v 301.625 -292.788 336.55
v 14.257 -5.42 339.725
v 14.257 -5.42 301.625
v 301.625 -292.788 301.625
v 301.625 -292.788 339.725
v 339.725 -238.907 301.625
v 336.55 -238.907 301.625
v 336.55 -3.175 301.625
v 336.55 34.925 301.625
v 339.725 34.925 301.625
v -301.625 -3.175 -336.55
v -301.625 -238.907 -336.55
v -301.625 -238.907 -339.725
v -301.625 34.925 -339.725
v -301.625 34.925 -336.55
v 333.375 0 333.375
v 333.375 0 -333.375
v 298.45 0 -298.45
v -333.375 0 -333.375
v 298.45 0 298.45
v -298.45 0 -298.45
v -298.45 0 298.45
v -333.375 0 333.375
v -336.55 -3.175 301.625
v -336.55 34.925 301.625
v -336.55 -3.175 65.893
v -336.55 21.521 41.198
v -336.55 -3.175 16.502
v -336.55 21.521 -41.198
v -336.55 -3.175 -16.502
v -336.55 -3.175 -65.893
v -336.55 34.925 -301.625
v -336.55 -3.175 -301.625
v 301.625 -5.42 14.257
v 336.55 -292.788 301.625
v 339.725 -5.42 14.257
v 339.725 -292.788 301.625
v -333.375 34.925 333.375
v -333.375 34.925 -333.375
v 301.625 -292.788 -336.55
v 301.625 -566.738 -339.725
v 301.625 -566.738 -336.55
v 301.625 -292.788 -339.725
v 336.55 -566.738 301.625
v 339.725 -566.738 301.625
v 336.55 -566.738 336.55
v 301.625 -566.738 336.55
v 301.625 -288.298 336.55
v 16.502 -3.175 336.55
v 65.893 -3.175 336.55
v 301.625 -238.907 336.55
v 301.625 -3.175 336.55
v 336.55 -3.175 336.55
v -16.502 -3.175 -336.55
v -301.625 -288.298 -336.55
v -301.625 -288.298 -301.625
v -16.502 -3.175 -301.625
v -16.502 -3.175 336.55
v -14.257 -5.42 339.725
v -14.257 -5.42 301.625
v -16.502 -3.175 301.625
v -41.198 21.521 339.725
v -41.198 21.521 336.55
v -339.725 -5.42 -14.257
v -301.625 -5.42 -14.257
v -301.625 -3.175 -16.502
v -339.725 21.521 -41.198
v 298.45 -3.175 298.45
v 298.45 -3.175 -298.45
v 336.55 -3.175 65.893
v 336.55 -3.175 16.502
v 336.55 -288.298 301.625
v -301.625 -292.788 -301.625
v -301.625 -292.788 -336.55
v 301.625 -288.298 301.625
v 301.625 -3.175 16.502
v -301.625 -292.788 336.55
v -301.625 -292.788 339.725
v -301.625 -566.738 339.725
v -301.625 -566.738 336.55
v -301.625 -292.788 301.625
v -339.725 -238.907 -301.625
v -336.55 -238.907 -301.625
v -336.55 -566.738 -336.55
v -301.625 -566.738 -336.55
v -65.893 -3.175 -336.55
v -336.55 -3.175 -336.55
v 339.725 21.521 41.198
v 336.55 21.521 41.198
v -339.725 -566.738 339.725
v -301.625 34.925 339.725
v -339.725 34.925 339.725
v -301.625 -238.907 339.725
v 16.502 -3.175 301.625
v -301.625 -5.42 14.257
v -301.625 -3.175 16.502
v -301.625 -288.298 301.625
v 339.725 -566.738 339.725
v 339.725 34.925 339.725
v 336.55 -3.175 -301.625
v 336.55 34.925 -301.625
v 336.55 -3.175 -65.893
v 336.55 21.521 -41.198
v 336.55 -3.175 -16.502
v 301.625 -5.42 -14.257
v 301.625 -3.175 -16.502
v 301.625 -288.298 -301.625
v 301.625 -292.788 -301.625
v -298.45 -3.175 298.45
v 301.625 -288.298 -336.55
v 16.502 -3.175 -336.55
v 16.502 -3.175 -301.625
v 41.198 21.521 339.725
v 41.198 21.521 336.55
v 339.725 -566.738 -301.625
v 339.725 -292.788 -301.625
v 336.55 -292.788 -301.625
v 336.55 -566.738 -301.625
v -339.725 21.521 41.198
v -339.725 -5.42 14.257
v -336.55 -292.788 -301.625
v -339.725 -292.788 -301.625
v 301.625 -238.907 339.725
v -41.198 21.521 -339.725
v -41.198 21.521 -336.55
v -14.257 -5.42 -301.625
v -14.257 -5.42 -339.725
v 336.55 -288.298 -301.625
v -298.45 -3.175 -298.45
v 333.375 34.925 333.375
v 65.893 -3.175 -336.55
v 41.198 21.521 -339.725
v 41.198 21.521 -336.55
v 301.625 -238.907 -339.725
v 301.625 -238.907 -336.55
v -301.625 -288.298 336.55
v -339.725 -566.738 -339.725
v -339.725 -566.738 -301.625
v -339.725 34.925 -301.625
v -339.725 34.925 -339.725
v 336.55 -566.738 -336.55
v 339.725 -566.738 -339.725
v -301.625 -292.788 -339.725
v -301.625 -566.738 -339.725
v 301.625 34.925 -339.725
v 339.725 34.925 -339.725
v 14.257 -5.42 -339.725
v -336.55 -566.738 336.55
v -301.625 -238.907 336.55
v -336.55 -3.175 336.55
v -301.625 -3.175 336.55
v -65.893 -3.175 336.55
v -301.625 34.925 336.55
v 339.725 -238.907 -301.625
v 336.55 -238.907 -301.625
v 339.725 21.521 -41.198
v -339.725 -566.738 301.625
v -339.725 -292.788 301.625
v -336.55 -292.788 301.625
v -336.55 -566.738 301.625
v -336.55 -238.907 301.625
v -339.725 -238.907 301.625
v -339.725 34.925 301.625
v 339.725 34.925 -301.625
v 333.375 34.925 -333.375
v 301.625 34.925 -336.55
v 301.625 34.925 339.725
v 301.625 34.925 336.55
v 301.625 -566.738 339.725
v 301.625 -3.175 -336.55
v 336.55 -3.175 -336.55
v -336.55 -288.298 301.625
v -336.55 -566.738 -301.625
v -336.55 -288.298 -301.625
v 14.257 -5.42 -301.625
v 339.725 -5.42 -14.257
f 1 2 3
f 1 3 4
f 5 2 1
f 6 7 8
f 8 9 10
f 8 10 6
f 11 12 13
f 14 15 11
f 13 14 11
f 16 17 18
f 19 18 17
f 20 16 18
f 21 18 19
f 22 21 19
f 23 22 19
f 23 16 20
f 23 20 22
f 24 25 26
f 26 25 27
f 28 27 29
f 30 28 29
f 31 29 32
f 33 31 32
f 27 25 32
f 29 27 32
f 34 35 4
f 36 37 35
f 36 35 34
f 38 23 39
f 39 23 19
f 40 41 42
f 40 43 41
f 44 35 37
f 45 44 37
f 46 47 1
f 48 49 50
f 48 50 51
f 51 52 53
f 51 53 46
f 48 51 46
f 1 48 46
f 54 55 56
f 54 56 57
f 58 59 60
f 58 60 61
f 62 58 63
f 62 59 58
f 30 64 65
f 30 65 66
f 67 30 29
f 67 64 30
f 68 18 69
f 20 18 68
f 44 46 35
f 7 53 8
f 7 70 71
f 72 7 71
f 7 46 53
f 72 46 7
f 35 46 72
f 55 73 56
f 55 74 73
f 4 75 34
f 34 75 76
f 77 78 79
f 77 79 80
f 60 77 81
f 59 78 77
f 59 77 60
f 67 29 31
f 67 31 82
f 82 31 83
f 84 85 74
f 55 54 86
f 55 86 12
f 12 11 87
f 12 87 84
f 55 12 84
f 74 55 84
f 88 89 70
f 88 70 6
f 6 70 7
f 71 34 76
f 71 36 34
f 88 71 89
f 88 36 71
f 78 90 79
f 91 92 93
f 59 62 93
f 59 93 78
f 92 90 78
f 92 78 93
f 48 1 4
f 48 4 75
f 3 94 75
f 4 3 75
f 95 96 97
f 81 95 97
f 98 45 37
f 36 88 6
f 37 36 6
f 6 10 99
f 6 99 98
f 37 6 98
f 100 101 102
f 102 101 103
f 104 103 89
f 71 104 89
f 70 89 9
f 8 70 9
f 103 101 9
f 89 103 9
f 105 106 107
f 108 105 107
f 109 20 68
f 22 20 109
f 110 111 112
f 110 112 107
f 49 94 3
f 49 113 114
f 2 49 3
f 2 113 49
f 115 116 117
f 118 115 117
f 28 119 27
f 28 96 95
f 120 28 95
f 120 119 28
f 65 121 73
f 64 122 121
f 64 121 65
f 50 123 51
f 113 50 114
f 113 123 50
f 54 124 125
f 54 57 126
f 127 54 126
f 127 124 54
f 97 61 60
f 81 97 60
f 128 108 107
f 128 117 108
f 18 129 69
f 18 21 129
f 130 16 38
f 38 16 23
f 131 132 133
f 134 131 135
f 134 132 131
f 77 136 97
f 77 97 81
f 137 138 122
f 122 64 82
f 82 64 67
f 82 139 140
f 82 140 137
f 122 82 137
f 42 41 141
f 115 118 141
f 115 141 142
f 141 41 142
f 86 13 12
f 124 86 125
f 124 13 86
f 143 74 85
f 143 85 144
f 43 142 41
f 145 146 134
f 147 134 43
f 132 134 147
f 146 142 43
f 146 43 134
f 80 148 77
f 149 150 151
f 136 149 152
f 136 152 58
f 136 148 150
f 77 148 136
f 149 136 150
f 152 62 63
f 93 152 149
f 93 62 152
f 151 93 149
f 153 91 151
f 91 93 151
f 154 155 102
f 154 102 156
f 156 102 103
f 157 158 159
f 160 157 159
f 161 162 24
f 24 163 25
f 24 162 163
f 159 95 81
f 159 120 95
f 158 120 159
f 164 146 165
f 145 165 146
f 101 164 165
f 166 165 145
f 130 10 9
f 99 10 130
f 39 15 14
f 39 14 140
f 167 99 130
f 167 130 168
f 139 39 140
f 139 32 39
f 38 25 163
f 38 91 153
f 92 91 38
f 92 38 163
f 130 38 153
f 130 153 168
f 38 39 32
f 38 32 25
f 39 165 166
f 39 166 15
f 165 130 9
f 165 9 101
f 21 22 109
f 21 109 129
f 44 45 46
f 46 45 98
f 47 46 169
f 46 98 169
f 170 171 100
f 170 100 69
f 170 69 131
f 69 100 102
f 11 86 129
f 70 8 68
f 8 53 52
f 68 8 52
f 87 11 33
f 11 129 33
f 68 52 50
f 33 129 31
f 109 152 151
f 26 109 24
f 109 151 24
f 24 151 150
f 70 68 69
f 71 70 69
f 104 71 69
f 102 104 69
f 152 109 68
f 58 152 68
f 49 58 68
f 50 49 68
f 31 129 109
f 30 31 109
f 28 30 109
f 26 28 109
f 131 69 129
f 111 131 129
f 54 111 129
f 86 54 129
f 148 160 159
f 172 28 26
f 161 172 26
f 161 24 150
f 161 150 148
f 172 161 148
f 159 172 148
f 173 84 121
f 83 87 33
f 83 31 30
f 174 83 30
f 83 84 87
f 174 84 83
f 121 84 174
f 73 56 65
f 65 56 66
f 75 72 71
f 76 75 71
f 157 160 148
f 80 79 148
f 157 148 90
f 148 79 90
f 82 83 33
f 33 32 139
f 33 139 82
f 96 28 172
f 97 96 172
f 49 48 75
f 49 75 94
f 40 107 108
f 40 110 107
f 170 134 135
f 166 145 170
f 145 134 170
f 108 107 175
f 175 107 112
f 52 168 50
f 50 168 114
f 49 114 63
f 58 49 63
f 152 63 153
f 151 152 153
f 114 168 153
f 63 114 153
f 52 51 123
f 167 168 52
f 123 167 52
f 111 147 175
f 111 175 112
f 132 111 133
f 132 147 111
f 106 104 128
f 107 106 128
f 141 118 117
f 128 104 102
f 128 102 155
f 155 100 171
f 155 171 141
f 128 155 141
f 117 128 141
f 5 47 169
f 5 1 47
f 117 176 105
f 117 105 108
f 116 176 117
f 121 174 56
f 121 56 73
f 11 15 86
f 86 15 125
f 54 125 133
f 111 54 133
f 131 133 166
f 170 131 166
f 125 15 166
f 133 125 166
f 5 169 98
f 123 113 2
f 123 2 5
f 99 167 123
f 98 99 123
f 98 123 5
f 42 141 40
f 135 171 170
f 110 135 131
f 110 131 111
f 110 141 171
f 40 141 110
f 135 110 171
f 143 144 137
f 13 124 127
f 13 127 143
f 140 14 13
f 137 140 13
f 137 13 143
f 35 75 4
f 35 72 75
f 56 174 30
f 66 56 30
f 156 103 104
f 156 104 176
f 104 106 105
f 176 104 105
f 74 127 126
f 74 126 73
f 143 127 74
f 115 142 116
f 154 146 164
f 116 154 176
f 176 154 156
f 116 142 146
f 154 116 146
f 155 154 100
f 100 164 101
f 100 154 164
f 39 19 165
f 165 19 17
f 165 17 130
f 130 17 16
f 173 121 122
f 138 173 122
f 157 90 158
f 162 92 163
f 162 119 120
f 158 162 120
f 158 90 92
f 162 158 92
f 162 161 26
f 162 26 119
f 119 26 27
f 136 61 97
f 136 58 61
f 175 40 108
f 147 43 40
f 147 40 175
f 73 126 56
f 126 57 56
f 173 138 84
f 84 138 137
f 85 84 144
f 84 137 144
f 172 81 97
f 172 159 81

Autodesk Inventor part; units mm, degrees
ref_plane "YZ Plane" through (0, 0, 0) normal (1, 0, 0) x (0, 1, 0)
ref_plane "XZ Plane" through (0, 0, 0) normal (0, 1, 0) x (-1, 0, 0)
ref_plane "XY Plane" through (0, 0, 0) normal (0, 0, 1) x (1, 0, 0)
sketch "Sketch1" plane through (0, 0, 0) normal (0, 1, 0) x (-1, 0, 0)
  line L0 (0, -471.17) -> (0, 471.17) projected
  line L1 (471.17, 0) -> (-471.17, 0) projected
  line L2 (-333.375, 333.375) -> (333.375, 333.375)
  line L3 (333.375, 333.375) -> (333.375, -333.375)
  line L4 (333.375, -333.375) -> (-333.375, -333.375)
  line L5 (-333.375, -333.375) -> (-333.375, 333.375)
  line L6 (-298.45, 298.45) -> (298.45, 298.45)
  line L7 (298.45, 298.45) -> (298.45, -298.45)
  line L8 (298.45, -298.45) -> (-298.45, -298.45)
  line L9 (-298.45, -298.45) -> (-298.45, 298.45)
  line L10 (-336.55, 336.55) -> (336.55, 336.55)
  line L11 (336.55, 336.55) -> (336.55, -336.55)
  line L12 (336.55, -336.55) -> (-336.55, -336.55)
  line L13 (-336.55, -336.55) -> (-336.55, 336.55)
  point P0 (0, 0)
  dimension "d0" = 666.75
  dimension "d1" = 666.75
  dimension "d4" = 3.175
  dimension "d5" = 3.175
  dimension "d50" = 38.1
  dimension "d51" = 38.1
extrude "Extrusion1" add sketch "Sketch1" against normal blind 3.175 contours L12 L13 L1 L5 L4 L0 | L0 L4 L3 L1 L11 L12 | L4 L5 L1 L9 L8 L0 | L0 L8 L7 L1 L3 L4 | L1 L3 L2 L0 L10 L11 | L13 L10 L0 L2 L5 L1 | L1 L7 L6 L0 L2 L3 | L5 L2 L0 L6 L9 L1
extrude "Extrusion2" add sketch "Sketch1" along normal blind 34.925 contours L12 L13 L1 L5 L4 L0 | L0 L4 L3 L1 L11 L12 | L1 L3 L2 L0 L10 L11 | L13 L10 L0 L2 L5 L1
sketch "Sketch2" plane through (0, 34.925, 0) normal (0, 1, 0) x (1, 0, 0)
  line L0 (336.55, -336.55) -> (336.55, 336.55) projected
  line L1 (336.55, 336.55) -> (-336.55, 336.55) projected
  line L2 (301.625, 336.55) -> (336.55, 336.55)
  line L3 (339.725, 339.725) -> (301.625, 339.725)
  line L4 (301.625, 339.725) -> (301.625, 336.55)
  line L5 (339.725, 339.725) -> (339.725, 301.625)
  line L6 (339.725, 301.625) -> (336.55, 301.625)
  line L7 (336.55, 301.625) -> (336.55, 336.55)
  point P0 (0, 0)
  dimension "d10" = 3.175
  dimension "d15" = 3.175
  dimension "d52" = 38.1
  dimension "d53" = 38.1
extrude "Extrusion3" add sketch "Sketch2" against normal blind 601.6625
sketch "Sketch4" plane through (336.55, -3.175, 336.55) normal (1, 0, 0) x (0, 0, -1)
  line L0 (673.1, 0) -> (0, 0) projected
  line L1 (377.7476, 24.6957) -> (350.8068, -2.2451)
  line L2 (350.8068, -2.2451) -> (638.175, -289.6133)
  line L3 (638.175, -289.6133) -> (638.175, -235.7317)
  line L4 (638.175, -235.7317) -> (377.7476, 24.6957)
  line L5 (638.175, 38.1) -> (638.175, -563.5625) projected
  line L6 (676.275, -563.5625) -> (638.175, -563.5625) projected
  line L7 (353.0519, 0) -> (638.175, -285.1231)
  line L8 (353.0519, 0) -> (350.8068, -2.2451)
  line L9 (350.8068, -2.2451) -> (638.175, -289.6133)
  line L10 (638.175, -289.6133) -> (638.175, -285.1231)
  line L11 (638.175, -285.1231) -> (353.0519, 0)
  point P0 (336.55, 3.175)
  point P1 (676.275, -339.725)
  dimension "d23" = 38.1
  dimension "d28" = 3.175
  dimension "d47" = 45
  dimension "d49" = 406.4
extrude "Extrusion5" add sketch "Sketch4" against normal blind 34.925 contours L7 L3 L2 L1
extrude "Extrusion6" add sketch "Sketch4" along normal blind 3.175 contours L4 L3 L7 L0 | L0 L1 L4 | L7 L3 L2 L1
sketch "Sketch5" plane through (339.725, 34.925, -339.725) normal (0, 0, -1) x (-1, 0, 0)
  line L0 (38.1, 0) -> (38.1, -601.6625) projected
  line L1 (676.275, -38.1) -> (38.1, -38.1) projected
  line L2 (676.275, 0) -> (676.275, -38.1) projected
  line L3 (38.1, 0) -> (676.275, 0) projected
  line L4 (38.1, -327.7133) -> (325.4682, -40.3451)
  line L5 (325.4682, -40.3451) -> (298.5274, -13.4043)
  line L6 (298.5274, -13.4043) -> (38.1, -273.8317)
  line L7 (38.1, -273.8317) -> (38.1, -327.7133)
  line L8 (323.2231, -38.1) -> (38.1, -323.2231)
  line L9 (38.1, 0) -> (38.1, -38.1) projected
  point P0 (0, -381)
  point P1 (339.725, -34.925)
  dimension "d33" = 38.1
  dimension "d35" = 3.175
  dimension "d45" = 45
  dimension "d48" = 406.4
extrude "Extrusion7" add sketch "Sketch5" against normal blind 3.175 contours L6 L1 L8 L0 | L6 L5 L1 | L8 L5 L4 L0
extrude "Extrusion8" add sketch "Sketch5" against normal blind 38.1 contours L8 L5 L4 L0
mirror "Mirror1" about plane through (0, 0, 0) normal (0, 0, 1) of "Extrusion8", "Extrusion7", "Extrusion6", "Extrusion5", "Extrusion3"
mirror "Mirror2" about plane through (0, 0, 0) normal (1, 0, 0) of "Extrusion8", "Extrusion7", "Extrusion6", "Extrusion5", "Extrusion3", "Mirror1"
properties part number "Single_Burner_Stand"
